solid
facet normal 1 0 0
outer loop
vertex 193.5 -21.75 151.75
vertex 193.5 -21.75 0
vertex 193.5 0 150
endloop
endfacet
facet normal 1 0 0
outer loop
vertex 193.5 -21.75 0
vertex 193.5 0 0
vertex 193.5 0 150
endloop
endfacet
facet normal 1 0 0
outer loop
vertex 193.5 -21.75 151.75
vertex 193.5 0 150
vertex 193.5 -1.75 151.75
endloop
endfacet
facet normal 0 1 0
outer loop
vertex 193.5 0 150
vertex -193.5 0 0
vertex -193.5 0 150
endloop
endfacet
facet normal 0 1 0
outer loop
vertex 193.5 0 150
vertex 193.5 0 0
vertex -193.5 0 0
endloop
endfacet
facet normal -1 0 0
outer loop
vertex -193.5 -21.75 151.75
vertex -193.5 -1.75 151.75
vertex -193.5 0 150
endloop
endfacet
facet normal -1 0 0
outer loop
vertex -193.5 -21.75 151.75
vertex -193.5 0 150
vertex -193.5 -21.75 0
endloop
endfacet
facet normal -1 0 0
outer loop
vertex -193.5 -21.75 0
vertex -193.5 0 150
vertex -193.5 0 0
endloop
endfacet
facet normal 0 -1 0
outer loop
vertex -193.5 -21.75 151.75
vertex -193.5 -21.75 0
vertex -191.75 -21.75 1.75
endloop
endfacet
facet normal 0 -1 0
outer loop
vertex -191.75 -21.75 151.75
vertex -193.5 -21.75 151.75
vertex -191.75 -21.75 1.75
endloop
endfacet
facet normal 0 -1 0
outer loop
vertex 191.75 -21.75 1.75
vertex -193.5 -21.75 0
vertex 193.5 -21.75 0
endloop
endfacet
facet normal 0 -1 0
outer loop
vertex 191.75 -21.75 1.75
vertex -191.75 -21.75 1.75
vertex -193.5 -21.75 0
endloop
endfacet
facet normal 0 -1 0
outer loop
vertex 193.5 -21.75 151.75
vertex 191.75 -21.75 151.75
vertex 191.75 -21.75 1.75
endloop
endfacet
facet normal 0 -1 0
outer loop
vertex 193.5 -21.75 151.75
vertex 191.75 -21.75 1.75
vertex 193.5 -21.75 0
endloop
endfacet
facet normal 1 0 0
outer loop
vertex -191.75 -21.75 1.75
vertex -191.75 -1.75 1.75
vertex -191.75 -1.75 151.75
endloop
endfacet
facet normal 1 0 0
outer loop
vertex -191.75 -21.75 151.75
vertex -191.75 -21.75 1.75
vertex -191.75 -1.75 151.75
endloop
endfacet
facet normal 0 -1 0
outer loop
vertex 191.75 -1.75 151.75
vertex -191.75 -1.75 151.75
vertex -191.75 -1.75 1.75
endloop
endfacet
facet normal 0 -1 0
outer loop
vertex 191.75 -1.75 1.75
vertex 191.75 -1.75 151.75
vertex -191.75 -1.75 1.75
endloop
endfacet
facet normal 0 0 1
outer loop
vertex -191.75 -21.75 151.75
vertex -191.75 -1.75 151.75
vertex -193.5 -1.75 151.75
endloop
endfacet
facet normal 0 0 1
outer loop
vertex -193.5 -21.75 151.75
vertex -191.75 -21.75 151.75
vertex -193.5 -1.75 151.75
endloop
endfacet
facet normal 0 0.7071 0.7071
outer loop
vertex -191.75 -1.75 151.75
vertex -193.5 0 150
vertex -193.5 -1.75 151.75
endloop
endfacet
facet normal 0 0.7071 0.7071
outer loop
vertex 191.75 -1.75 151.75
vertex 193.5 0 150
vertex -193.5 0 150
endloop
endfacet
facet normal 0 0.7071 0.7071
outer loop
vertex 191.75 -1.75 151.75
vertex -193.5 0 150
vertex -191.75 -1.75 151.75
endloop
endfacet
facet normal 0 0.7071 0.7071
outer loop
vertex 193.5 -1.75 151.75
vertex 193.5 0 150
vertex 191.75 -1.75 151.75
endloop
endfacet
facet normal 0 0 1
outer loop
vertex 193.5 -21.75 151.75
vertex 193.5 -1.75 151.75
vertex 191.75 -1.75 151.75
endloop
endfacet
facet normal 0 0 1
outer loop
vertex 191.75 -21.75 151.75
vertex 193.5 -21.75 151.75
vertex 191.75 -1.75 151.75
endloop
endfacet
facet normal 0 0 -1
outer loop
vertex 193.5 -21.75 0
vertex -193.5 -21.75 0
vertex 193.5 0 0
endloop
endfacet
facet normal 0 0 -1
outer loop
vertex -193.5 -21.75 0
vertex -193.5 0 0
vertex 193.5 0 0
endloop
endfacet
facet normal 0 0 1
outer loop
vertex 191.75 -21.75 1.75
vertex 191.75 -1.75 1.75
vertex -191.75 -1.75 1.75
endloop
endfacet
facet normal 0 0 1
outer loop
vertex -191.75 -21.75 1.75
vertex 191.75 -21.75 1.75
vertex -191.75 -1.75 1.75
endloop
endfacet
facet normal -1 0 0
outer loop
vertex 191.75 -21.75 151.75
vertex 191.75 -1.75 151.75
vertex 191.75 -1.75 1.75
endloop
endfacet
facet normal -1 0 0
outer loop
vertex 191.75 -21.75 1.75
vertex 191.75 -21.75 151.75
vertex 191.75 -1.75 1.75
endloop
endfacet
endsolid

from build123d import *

# Parameters (mm, degrees)
DODANIE_WYCI_GNI_CIE3_DEPTH = 193.5
DODANIE_WYCI_GNI_CIE4_DEPTH = 20


with BuildPart() as part:
    # Szkic3 → Dodanie-wyciągnięcie3 (new body, symmetric)
    with BuildSketch(Plane(origin=(0, 0, 0), x_dir=(0, 0, -1), z_dir=(1, 0, 0))):
        Polygon((0, 0), (-150, 0), (-151.75, -1.75), (0, -1.75), align=None)
    extrude(amount=DODANIE_WYCI_GNI_CIE3_DEPTH, both=True)

    # Szkic4 → Dodanie-wyciągnięcie4 (add)
    with BuildSketch(Plane.XZ.offset(1.75)):
        Polygon((-193.5, 151.75), (-193.5, 0), (193.5, 0), (193.5, 151.75), (191.75, 151.75), (191.75, 1.75), (-191.75, 1.75), (-191.75, 151.75), align=None)
    extrude(amount=DODANIE_WYCI_GNI_CIE4_DEPTH)


solid = part.part
